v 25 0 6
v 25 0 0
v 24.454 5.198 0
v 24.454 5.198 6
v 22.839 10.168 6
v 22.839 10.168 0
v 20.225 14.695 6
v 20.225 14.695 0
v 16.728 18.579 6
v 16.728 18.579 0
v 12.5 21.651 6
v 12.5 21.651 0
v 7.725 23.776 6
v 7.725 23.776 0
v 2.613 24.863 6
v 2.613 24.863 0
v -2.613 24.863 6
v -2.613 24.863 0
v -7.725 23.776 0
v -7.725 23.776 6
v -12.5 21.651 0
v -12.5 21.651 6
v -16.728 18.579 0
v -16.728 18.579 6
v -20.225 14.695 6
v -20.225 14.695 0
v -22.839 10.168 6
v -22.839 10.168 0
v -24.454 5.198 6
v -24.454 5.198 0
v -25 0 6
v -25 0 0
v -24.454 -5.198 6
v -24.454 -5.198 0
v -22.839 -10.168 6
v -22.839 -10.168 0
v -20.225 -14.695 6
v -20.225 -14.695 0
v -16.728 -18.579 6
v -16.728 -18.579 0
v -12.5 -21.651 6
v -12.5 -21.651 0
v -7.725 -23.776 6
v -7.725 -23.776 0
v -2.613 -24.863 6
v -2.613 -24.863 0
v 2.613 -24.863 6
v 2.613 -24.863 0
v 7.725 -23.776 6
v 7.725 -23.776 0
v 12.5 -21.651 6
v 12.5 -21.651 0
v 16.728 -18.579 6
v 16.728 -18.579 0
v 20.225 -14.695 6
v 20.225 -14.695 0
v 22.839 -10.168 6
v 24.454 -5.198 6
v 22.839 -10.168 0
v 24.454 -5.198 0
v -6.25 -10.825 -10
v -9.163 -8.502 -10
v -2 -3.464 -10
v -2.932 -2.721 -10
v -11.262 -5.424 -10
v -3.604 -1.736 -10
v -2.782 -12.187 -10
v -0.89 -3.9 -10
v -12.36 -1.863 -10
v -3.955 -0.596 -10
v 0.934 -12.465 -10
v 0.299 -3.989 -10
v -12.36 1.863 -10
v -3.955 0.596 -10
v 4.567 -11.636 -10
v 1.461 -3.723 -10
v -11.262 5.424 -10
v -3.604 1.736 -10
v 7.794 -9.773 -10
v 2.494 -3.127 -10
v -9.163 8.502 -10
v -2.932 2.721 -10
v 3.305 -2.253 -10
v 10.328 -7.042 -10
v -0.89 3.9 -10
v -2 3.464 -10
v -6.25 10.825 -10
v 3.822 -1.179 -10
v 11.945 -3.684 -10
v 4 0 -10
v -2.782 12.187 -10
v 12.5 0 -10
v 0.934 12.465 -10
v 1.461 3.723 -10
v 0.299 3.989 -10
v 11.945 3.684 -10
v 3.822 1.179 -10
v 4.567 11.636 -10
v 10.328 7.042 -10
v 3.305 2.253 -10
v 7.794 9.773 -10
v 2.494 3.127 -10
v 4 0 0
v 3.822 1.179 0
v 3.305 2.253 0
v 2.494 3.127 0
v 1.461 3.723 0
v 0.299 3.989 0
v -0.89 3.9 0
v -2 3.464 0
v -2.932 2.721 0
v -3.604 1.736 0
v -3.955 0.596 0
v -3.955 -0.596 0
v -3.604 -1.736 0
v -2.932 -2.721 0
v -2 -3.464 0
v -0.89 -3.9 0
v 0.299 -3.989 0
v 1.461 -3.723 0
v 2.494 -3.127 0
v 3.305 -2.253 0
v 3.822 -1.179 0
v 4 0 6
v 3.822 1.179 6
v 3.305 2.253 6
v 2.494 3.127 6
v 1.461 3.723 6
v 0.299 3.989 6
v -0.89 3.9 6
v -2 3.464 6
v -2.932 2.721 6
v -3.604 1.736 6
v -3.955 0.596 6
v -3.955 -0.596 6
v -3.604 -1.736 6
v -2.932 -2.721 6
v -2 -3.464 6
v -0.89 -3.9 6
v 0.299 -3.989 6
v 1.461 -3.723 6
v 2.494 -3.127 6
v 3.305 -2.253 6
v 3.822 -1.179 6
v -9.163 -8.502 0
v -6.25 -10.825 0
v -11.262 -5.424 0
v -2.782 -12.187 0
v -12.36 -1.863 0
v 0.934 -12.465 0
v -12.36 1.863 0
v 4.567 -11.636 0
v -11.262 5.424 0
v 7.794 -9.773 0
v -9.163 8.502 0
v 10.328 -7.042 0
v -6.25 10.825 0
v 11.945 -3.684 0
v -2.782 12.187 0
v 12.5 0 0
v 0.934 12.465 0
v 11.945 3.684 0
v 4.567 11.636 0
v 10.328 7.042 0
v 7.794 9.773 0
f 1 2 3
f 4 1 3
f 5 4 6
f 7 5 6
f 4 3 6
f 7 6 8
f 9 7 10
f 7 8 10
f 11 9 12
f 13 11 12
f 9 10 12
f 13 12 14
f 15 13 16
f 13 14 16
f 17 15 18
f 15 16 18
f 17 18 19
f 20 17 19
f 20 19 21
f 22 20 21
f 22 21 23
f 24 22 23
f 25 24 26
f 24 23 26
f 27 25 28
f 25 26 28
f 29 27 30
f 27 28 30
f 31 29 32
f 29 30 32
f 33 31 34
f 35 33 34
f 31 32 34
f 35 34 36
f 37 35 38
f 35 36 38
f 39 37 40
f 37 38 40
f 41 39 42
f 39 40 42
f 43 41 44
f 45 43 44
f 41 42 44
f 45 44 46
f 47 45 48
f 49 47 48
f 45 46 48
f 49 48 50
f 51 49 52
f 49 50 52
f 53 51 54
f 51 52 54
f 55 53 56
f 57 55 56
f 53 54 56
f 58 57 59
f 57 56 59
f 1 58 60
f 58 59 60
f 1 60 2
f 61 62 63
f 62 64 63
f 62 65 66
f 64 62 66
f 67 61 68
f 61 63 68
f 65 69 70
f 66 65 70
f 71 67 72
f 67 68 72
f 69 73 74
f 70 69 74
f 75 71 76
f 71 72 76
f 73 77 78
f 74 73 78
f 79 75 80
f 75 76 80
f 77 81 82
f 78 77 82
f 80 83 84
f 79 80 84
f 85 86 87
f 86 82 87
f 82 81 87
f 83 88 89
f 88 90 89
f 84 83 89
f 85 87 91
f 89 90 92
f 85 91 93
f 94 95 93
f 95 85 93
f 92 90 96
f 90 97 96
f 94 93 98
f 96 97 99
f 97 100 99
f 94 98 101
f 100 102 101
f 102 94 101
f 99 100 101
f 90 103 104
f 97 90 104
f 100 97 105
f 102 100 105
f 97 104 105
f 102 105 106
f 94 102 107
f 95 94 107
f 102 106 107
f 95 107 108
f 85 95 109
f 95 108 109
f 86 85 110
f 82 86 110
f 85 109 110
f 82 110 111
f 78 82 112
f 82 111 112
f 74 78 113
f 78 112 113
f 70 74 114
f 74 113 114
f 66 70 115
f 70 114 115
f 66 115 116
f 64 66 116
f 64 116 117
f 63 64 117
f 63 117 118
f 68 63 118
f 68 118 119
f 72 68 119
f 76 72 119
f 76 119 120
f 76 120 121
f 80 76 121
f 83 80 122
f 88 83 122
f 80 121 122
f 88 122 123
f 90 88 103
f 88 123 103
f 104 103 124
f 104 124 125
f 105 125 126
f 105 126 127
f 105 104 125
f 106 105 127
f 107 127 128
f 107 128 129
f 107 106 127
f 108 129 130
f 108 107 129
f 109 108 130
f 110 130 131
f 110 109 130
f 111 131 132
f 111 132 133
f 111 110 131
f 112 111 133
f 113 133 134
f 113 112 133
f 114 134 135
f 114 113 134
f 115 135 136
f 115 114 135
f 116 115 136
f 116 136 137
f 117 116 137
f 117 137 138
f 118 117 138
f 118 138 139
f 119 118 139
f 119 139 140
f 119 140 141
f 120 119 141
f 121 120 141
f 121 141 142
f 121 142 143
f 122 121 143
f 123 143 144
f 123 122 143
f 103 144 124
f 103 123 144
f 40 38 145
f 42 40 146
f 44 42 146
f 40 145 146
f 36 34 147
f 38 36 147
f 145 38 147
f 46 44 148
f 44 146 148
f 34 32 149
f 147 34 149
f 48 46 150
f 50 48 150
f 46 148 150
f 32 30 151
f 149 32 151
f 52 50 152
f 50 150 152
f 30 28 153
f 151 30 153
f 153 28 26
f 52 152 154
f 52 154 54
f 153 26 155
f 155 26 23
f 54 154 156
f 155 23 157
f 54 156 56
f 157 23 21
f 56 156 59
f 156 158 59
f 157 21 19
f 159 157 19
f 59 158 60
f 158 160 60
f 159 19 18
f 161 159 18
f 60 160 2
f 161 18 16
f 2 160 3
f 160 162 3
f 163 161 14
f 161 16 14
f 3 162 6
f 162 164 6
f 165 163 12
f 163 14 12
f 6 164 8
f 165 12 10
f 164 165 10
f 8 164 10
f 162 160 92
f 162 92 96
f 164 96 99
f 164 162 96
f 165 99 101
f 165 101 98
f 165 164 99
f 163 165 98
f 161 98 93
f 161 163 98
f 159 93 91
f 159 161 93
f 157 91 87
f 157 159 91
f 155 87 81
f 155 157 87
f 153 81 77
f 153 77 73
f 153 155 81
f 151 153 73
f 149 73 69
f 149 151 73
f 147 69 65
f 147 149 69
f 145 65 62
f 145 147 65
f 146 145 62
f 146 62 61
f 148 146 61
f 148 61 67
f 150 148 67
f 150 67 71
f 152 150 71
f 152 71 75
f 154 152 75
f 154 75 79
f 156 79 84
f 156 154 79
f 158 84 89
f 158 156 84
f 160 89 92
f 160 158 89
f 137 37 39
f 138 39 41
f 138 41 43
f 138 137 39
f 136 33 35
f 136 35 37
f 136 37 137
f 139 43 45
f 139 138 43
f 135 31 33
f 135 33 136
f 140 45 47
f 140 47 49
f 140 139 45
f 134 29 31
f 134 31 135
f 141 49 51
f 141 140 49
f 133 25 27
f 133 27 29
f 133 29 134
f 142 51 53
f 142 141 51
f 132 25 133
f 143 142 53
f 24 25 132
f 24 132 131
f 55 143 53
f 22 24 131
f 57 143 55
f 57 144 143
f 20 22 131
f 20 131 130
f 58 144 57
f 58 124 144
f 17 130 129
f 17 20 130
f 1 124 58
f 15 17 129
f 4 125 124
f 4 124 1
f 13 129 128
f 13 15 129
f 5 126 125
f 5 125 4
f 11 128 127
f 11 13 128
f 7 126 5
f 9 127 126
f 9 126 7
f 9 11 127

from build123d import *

# Parameters (mm, degrees)
SKETCH_1_R      = 25
SKETCH_1_R_2    = 4
EXTRUDE_1_DEPTH = 6
EXTRUDE_START   = -10
SKETCH_1_3_R    = 12.5
SKETCH_1_3_R_2  = 4
EXTRUDE_2_DEPTH = 10


with BuildPart() as part:
    # Эскиз1 → Бобышка-Вытянуть1 (new body)
    with BuildSketch(Plane.XY):
        Circle(SKETCH_1_R)
        Circle(SKETCH_1_R_2, mode=Mode.SUBTRACT)
    extrude(amount=EXTRUDE_1_DEPTH)

    # Эскиз1<3> → Бобышка-Вытянуть2 (add)
    with BuildSketch(Plane.XY.offset(EXTRUDE_START)):
        Circle(SKETCH_1_3_R)
        Circle(SKETCH_1_3_R_2, mode=Mode.SUBTRACT)
    extrude(amount=EXTRUDE_2_DEPTH)


solid = part.part
